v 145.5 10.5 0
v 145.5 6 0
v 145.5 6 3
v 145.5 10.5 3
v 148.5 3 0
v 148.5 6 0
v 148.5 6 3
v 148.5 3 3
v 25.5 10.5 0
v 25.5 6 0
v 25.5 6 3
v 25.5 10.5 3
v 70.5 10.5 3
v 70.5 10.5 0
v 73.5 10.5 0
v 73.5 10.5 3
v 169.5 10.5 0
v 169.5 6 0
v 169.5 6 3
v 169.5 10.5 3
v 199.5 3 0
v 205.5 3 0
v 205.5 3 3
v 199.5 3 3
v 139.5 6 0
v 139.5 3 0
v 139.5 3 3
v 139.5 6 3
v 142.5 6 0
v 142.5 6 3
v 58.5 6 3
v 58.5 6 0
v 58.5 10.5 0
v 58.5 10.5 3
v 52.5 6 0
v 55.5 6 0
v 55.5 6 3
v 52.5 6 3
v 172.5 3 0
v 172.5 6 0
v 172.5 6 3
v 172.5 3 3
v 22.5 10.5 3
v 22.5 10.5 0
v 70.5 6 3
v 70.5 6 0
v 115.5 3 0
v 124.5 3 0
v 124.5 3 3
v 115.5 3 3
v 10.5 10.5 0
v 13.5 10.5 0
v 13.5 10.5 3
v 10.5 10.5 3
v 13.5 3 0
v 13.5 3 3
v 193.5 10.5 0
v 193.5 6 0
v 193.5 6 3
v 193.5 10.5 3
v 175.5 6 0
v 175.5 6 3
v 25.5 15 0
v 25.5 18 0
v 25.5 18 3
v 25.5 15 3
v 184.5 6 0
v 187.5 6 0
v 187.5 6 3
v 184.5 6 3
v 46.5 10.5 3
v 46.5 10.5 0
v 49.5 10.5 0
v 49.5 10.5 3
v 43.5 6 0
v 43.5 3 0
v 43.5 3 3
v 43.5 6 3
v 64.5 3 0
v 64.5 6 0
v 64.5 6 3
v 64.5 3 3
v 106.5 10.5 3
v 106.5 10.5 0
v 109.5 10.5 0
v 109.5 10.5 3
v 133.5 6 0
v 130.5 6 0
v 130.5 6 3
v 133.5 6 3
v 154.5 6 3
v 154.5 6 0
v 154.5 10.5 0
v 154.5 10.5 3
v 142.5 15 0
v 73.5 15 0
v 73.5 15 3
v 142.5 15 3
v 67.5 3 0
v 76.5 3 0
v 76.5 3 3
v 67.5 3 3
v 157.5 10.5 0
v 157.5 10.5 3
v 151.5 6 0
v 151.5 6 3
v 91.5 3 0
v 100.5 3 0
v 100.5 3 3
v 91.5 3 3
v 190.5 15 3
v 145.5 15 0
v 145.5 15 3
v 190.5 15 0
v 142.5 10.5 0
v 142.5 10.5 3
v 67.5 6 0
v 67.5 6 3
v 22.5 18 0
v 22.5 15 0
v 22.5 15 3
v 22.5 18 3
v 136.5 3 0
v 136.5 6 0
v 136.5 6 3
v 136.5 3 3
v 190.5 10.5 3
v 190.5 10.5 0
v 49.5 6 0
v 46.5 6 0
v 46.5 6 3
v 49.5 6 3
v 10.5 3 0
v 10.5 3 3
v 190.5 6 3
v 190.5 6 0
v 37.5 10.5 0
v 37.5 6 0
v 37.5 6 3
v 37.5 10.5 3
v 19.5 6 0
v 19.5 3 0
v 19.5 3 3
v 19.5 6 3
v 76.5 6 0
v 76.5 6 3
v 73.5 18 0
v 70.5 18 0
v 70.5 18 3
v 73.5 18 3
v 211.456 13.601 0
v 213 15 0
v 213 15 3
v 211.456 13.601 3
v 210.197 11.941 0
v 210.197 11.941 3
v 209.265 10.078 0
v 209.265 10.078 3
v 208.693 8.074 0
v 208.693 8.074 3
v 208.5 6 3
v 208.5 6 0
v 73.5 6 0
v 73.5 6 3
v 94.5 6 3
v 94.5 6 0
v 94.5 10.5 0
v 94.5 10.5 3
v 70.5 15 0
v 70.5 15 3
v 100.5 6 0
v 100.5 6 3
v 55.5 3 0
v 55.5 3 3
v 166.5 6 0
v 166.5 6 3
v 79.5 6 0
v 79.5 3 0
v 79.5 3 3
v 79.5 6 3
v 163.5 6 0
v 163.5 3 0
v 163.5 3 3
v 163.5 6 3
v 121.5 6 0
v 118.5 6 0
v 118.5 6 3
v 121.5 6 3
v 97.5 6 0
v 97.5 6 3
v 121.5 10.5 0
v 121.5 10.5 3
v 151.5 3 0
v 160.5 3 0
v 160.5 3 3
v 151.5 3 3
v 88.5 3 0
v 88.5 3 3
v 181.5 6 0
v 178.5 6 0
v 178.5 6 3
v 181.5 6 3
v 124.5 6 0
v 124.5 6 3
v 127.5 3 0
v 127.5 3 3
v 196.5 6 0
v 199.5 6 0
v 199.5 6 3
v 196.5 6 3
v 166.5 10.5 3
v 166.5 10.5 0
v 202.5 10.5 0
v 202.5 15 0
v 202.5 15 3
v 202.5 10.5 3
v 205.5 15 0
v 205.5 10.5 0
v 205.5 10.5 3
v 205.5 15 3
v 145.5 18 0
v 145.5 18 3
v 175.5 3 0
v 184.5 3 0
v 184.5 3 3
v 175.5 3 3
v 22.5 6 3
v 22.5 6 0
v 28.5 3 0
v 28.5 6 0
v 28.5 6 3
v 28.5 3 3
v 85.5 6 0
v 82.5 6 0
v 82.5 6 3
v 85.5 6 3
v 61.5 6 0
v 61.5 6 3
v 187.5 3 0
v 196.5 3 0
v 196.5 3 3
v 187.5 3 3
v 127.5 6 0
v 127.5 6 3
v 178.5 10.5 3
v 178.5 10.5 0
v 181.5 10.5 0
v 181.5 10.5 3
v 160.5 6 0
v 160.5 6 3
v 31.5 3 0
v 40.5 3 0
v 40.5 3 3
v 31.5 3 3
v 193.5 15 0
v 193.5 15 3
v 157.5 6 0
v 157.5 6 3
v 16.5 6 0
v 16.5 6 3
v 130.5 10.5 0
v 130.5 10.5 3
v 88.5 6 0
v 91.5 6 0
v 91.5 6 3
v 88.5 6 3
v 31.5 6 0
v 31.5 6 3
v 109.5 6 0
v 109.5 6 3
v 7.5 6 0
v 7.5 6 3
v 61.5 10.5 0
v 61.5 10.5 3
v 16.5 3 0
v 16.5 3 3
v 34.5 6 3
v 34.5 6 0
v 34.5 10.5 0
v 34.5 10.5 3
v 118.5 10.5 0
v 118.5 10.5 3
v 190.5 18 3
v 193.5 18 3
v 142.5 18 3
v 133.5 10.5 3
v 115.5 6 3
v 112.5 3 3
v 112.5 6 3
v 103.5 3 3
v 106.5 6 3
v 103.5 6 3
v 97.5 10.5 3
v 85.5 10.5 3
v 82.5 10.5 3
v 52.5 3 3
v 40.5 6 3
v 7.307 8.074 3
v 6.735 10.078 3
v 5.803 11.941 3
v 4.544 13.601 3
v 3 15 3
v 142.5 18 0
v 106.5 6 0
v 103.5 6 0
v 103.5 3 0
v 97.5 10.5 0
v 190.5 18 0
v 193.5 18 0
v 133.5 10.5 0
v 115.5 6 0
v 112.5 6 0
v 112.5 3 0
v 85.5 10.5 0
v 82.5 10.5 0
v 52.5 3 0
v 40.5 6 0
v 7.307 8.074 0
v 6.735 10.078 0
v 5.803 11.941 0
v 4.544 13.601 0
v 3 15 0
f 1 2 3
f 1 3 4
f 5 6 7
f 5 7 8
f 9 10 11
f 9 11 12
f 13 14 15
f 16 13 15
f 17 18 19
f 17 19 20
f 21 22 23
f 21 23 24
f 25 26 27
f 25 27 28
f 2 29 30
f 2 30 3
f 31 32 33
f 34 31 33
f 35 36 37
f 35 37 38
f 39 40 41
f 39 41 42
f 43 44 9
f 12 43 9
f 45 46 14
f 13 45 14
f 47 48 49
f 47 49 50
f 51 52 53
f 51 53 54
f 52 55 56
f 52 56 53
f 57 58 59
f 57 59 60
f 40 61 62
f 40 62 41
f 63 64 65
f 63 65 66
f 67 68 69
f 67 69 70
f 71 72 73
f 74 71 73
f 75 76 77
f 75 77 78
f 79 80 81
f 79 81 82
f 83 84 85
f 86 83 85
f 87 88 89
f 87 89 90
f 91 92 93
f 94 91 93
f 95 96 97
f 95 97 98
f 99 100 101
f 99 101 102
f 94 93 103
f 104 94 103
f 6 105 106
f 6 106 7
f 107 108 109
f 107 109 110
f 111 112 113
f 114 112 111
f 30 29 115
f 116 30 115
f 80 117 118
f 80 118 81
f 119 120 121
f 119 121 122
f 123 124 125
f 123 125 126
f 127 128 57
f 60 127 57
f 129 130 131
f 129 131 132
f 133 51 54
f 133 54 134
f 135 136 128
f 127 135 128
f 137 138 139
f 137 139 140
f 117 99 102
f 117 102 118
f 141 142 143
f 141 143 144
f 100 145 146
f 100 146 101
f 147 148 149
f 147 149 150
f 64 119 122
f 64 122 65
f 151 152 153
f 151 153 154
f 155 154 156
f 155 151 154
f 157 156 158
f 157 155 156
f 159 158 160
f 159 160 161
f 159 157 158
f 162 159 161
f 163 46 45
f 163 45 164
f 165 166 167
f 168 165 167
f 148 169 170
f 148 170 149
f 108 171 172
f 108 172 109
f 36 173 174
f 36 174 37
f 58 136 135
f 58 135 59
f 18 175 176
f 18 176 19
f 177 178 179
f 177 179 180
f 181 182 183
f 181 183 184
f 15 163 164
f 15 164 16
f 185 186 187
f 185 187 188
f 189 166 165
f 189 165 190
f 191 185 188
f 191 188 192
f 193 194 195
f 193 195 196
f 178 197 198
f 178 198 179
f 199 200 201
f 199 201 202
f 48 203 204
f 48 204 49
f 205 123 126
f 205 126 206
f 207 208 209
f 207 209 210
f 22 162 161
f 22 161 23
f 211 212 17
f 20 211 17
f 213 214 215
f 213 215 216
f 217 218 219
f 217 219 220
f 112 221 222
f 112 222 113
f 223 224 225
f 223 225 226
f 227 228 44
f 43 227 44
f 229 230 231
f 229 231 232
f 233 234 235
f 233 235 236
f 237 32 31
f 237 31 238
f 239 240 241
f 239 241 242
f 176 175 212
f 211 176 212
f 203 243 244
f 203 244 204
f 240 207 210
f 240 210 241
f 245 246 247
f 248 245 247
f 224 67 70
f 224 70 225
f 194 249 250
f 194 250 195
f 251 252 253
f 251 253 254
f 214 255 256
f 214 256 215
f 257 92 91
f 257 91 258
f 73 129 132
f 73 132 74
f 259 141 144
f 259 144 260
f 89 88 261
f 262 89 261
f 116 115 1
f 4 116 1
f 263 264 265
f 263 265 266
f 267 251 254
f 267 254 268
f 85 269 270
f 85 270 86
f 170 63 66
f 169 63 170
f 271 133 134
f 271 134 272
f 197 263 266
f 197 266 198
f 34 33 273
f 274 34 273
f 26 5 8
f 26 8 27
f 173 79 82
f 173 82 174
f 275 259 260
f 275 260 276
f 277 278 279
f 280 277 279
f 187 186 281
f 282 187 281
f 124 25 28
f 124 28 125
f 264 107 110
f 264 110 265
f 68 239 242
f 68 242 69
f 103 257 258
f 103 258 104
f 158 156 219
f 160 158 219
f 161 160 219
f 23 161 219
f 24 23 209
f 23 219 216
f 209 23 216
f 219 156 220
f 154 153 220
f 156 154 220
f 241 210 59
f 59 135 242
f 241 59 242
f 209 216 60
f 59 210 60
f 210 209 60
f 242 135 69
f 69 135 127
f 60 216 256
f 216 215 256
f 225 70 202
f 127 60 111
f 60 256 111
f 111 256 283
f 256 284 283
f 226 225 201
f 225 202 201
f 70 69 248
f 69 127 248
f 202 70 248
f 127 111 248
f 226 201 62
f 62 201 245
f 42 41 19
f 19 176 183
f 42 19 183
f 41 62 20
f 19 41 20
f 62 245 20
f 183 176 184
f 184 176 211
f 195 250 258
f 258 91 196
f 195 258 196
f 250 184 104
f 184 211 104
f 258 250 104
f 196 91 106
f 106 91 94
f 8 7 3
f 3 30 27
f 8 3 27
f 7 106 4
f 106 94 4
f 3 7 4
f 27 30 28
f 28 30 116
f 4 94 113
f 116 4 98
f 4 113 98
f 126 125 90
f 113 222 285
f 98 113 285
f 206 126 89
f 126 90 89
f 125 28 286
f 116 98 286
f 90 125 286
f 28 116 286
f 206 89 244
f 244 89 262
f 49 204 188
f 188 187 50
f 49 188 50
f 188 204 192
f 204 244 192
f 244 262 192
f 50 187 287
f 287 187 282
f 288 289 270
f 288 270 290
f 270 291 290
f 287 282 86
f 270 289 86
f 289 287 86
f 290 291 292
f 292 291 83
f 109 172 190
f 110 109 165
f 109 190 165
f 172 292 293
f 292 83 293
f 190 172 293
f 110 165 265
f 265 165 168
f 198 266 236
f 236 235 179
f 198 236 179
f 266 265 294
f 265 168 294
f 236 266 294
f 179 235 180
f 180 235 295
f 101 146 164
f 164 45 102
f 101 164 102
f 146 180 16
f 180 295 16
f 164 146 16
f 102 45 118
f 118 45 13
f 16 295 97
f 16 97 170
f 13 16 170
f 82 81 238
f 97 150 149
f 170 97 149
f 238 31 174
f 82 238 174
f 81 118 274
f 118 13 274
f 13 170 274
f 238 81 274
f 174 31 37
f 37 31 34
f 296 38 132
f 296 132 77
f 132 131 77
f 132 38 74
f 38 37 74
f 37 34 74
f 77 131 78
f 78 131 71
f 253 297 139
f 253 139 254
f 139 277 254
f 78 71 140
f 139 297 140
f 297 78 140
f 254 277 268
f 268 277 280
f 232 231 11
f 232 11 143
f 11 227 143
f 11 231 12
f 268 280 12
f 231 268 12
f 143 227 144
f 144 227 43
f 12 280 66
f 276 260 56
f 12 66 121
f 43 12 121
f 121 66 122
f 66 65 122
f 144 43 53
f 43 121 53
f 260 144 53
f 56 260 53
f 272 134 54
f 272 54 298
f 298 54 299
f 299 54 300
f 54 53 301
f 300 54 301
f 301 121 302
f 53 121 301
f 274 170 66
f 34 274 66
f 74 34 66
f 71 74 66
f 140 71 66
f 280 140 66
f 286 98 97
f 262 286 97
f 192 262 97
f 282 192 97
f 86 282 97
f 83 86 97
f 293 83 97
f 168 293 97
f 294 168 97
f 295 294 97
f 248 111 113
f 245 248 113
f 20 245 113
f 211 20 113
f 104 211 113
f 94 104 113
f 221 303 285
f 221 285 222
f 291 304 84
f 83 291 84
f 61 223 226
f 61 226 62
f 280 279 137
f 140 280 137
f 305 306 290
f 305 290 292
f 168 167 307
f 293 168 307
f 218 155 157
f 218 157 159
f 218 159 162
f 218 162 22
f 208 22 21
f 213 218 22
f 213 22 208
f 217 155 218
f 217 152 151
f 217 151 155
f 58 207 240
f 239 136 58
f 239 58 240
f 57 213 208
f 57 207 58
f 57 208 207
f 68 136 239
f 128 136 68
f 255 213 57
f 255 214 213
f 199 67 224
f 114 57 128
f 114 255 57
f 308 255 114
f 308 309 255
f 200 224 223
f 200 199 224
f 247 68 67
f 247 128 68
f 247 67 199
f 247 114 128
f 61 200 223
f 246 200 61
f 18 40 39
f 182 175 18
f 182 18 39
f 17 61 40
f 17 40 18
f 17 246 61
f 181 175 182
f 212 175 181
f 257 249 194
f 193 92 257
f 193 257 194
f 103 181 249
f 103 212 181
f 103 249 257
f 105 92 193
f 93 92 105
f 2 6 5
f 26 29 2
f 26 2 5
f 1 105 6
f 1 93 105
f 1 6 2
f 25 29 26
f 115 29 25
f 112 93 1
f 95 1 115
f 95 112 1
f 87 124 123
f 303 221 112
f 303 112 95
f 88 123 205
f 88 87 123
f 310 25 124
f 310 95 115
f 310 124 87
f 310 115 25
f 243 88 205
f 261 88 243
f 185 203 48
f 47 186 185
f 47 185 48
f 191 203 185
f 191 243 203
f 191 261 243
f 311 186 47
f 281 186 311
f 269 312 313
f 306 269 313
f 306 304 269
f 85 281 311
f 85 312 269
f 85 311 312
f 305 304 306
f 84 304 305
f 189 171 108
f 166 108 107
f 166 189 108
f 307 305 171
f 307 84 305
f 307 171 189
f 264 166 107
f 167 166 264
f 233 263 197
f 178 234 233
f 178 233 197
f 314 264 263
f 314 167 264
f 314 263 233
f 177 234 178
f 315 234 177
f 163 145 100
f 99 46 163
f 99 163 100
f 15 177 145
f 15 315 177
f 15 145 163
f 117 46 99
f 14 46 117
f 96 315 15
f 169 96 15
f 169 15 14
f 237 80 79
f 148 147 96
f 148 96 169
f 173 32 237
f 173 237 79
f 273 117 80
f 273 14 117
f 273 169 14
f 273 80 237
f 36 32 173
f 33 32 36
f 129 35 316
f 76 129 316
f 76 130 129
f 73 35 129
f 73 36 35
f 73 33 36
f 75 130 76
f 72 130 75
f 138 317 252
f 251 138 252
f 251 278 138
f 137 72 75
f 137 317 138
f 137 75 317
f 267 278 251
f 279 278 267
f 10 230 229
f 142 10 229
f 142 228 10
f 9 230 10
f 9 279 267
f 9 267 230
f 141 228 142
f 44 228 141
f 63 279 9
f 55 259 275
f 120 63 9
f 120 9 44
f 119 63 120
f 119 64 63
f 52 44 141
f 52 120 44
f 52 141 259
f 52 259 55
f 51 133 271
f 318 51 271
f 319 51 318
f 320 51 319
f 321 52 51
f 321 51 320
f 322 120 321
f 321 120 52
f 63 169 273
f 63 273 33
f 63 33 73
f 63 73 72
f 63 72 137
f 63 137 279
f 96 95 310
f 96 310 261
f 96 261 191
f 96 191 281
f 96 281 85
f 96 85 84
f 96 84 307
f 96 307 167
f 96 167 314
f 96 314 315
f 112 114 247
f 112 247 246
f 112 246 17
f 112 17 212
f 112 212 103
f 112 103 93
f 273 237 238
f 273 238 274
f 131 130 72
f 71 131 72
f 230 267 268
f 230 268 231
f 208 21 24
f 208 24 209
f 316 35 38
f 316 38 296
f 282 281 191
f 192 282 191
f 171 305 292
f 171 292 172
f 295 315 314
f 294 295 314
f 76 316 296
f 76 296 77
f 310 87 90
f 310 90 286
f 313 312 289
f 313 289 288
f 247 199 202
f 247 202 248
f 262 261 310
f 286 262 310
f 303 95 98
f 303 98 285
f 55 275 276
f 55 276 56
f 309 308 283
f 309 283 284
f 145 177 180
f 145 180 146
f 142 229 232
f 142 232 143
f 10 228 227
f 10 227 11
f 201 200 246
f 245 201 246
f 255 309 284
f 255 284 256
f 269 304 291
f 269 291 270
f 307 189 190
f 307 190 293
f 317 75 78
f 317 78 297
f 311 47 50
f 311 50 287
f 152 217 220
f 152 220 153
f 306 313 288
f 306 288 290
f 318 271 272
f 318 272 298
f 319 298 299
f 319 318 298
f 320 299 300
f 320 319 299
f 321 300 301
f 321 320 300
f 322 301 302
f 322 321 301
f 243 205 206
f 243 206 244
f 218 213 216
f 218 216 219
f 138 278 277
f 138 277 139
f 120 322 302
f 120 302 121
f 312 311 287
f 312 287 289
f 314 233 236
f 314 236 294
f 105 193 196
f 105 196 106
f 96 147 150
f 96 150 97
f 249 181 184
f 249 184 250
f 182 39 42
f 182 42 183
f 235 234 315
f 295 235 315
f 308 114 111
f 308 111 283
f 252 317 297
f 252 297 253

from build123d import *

# Parameters (mm, degrees)
SKETCH1_W           = 3
SKETCH1_H           = 4.5
BOSS_EXTRUDE1_DEPTH = 3


with BuildPart() as part:
    # Sketch1 → Boss-Extrude1 (new body)
    with BuildSketch(Plane.XY):
        with BuildLine():
            Line((187.5, 3), (187.5, 6))
            Line((187.5, 6), (184.5, 6))
            Line((184.5, 6), (184.5, 3))
            Line((184.5, 3), (175.5, 3))
            Line((175.5, 3), (175.5, 6))
            Line((175.5, 6), (172.5, 6))
            Line((172.5, 6), (172.5, 3))
            Line((172.5, 3), (163.5, 3))
            Line((163.5, 3), (163.5, 6))
            Line((163.5, 6), (160.5, 6))
            Line((160.5, 6), (160.5, 3))
            Line((160.5, 3), (151.5, 3))
            Line((151.5, 3), (151.5, 6))
            Line((151.5, 6), (148.5, 6))
            Line((148.5, 6), (148.5, 3))
            Line((148.5, 3), (139.5, 3))
            Line((139.5, 3), (139.5, 6))
            Line((139.5, 6), (136.5, 6))
            Line((136.5, 6), (136.5, 3))
            Line((136.5, 3), (127.5, 3))
            Line((127.5, 3), (127.5, 6))
            Line((127.5, 6), (124.5, 6))
            Line((124.5, 6), (124.5, 3))
            Line((124.5, 3), (115.5, 3))
            Line((115.5, 3), (115.5, 6))
            Line((115.5, 6), (112.5, 6))
            Line((112.5, 6), (112.5, 3))
            Line((112.5, 3), (103.5, 3))
            Line((103.5, 3), (103.5, 6))
            Line((103.5, 6), (100.5, 6))
            Line((100.5, 6), (100.5, 3))
            Line((100.5, 3), (91.5, 3))
            Line((91.5, 3), (91.5, 6))
            Line((91.5, 6), (88.5, 6))
            Line((88.5, 6), (88.5, 3))
            Line((88.5, 3), (79.5, 3))
            Line((79.5, 3), (79.5, 6))
            Line((79.5, 6), (76.5, 6))
            Line((76.5, 6), (76.5, 3))
            Line((76.5, 3), (67.5, 3))
            Line((67.5, 3), (67.5, 6))
            Line((67.5, 6), (64.5, 6))
            Line((64.5, 6), (64.5, 3))
            Line((64.5, 3), (55.5, 3))
            Line((55.5, 3), (55.5, 6))
            Line((55.5, 6), (52.5, 6))
            Line((52.5, 6), (52.5, 3))
            Line((52.5, 3), (43.5, 3))
            Line((43.5, 3), (43.5, 6))
            Line((43.5, 6), (40.5, 6))
            Line((40.5, 6), (40.5, 3))
            Line((40.5, 3), (31.5, 3))
            Line((31.5, 3), (31.5, 6))
            Line((31.5, 6), (28.5, 6))
            Line((28.5, 6), (28.5, 3))
            Line((28.5, 3), (19.5, 3))
            Line((19.5, 3), (19.5, 6))
            Line((19.5, 6), (16.5, 6))
            Line((16.5, 6), (16.5, 3))
            Line((16.5, 3), (13.5, 3))
            Line((13.5, 3), (13.5, 10.5))
            Line((13.5, 10.5), (10.5, 10.5))
            Line((10.5, 10.5), (10.5, 3))
            Line((10.5, 3), (7.5, 6))
            ThreePointArc((7.5, 6), (6.312305899, 11.031152949), (3, 15))
            Line((3, 15), (22.5, 15))
            Line((22.5, 15), (22.5, 18))
            Line((22.5, 18), (25.5, 18))
            Line((25.5, 18), (25.5, 15))
            Line((25.5, 15), (70.5, 15))
            Line((70.5, 15), (70.5, 18))
            Line((70.5, 18), (73.5, 18))
            Line((73.5, 18), (73.5, 15))
            Line((73.5, 15), (142.5, 15))
            Line((142.5, 15), (142.5, 18))
            Line((142.5, 18), (145.5, 18))
            Line((145.5, 18), (145.5, 15))
            Line((145.5, 15), (190.5, 15))
            Line((190.5, 15), (190.5, 18))
            Line((190.5, 18), (193.5, 18))
            Line((193.5, 18), (193.5, 15))
            Line((193.5, 15), (202.5, 15))
            Line((202.5, 15), (202.5, 10.5))
            Line((202.5, 10.5), (205.5, 10.5))
            Line((205.5, 10.5), (205.5, 15))
            Line((205.5, 15), (213, 15))
            ThreePointArc((213, 15), (209.687694101, 11.031152949), (208.5, 6))
            Line((208.5, 6), (205.5, 3))
            Line((205.5, 3), (199.5, 3))
            Line((199.5, 3), (199.5, 6))
            Line((199.5, 6), (196.5, 6))
            Line((196.5, 6), (196.5, 3))
            Line((196.5, 3), (187.5, 3))
        make_face()
        with Locations((24, 8.25)):
            Rectangle(SKETCH1_W, SKETCH1_H, mode=Mode.SUBTRACT)
        with Locations((36, 8.25)):
            Rectangle(SKETCH1_W, SKETCH1_H, mode=Mode.SUBTRACT)
        with Locations((48, 8.25)):
            Rectangle(SKETCH1_W, SKETCH1_H, mode=Mode.SUBTRACT)
        with Locations((60, 8.25)):
            Rectangle(SKETCH1_W, SKETCH1_H, mode=Mode.SUBTRACT)
        with Locations((72, 8.25)):
            Rectangle(SKETCH1_W, SKETCH1_H, mode=Mode.SUBTRACT)
        with Locations((84, 8.25)):
            Rectangle(SKETCH1_W, SKETCH1_H, mode=Mode.SUBTRACT)
        with Locations((96, 8.25)):
            Rectangle(SKETCH1_W, SKETCH1_H, mode=Mode.SUBTRACT)
        with Locations((108, 8.25)):
            Rectangle(SKETCH1_W, SKETCH1_H, mode=Mode.SUBTRACT)
        with Locations((120, 8.25)):
            Rectangle(SKETCH1_W, SKETCH1_H, mode=Mode.SUBTRACT)
        with Locations((132, 8.25)):
            Rectangle(SKETCH1_W, SKETCH1_H, mode=Mode.SUBTRACT)
        with Locations((144, 8.25)):
            Rectangle(SKETCH1_W, SKETCH1_H, mode=Mode.SUBTRACT)
        with Locations((156, 8.25)):
            Rectangle(SKETCH1_W, SKETCH1_H, mode=Mode.SUBTRACT)
        with Locations((168, 8.25)):
            Rectangle(SKETCH1_W, SKETCH1_H, mode=Mode.SUBTRACT)
        with Locations((180, 8.25)):
            Rectangle(SKETCH1_W, SKETCH1_H, mode=Mode.SUBTRACT)
        with Locations((192, 8.25)):
            Rectangle(SKETCH1_W, SKETCH1_H, mode=Mode.SUBTRACT)
    extrude(amount=BOSS_EXTRUDE1_DEPTH)


solid = part.part
